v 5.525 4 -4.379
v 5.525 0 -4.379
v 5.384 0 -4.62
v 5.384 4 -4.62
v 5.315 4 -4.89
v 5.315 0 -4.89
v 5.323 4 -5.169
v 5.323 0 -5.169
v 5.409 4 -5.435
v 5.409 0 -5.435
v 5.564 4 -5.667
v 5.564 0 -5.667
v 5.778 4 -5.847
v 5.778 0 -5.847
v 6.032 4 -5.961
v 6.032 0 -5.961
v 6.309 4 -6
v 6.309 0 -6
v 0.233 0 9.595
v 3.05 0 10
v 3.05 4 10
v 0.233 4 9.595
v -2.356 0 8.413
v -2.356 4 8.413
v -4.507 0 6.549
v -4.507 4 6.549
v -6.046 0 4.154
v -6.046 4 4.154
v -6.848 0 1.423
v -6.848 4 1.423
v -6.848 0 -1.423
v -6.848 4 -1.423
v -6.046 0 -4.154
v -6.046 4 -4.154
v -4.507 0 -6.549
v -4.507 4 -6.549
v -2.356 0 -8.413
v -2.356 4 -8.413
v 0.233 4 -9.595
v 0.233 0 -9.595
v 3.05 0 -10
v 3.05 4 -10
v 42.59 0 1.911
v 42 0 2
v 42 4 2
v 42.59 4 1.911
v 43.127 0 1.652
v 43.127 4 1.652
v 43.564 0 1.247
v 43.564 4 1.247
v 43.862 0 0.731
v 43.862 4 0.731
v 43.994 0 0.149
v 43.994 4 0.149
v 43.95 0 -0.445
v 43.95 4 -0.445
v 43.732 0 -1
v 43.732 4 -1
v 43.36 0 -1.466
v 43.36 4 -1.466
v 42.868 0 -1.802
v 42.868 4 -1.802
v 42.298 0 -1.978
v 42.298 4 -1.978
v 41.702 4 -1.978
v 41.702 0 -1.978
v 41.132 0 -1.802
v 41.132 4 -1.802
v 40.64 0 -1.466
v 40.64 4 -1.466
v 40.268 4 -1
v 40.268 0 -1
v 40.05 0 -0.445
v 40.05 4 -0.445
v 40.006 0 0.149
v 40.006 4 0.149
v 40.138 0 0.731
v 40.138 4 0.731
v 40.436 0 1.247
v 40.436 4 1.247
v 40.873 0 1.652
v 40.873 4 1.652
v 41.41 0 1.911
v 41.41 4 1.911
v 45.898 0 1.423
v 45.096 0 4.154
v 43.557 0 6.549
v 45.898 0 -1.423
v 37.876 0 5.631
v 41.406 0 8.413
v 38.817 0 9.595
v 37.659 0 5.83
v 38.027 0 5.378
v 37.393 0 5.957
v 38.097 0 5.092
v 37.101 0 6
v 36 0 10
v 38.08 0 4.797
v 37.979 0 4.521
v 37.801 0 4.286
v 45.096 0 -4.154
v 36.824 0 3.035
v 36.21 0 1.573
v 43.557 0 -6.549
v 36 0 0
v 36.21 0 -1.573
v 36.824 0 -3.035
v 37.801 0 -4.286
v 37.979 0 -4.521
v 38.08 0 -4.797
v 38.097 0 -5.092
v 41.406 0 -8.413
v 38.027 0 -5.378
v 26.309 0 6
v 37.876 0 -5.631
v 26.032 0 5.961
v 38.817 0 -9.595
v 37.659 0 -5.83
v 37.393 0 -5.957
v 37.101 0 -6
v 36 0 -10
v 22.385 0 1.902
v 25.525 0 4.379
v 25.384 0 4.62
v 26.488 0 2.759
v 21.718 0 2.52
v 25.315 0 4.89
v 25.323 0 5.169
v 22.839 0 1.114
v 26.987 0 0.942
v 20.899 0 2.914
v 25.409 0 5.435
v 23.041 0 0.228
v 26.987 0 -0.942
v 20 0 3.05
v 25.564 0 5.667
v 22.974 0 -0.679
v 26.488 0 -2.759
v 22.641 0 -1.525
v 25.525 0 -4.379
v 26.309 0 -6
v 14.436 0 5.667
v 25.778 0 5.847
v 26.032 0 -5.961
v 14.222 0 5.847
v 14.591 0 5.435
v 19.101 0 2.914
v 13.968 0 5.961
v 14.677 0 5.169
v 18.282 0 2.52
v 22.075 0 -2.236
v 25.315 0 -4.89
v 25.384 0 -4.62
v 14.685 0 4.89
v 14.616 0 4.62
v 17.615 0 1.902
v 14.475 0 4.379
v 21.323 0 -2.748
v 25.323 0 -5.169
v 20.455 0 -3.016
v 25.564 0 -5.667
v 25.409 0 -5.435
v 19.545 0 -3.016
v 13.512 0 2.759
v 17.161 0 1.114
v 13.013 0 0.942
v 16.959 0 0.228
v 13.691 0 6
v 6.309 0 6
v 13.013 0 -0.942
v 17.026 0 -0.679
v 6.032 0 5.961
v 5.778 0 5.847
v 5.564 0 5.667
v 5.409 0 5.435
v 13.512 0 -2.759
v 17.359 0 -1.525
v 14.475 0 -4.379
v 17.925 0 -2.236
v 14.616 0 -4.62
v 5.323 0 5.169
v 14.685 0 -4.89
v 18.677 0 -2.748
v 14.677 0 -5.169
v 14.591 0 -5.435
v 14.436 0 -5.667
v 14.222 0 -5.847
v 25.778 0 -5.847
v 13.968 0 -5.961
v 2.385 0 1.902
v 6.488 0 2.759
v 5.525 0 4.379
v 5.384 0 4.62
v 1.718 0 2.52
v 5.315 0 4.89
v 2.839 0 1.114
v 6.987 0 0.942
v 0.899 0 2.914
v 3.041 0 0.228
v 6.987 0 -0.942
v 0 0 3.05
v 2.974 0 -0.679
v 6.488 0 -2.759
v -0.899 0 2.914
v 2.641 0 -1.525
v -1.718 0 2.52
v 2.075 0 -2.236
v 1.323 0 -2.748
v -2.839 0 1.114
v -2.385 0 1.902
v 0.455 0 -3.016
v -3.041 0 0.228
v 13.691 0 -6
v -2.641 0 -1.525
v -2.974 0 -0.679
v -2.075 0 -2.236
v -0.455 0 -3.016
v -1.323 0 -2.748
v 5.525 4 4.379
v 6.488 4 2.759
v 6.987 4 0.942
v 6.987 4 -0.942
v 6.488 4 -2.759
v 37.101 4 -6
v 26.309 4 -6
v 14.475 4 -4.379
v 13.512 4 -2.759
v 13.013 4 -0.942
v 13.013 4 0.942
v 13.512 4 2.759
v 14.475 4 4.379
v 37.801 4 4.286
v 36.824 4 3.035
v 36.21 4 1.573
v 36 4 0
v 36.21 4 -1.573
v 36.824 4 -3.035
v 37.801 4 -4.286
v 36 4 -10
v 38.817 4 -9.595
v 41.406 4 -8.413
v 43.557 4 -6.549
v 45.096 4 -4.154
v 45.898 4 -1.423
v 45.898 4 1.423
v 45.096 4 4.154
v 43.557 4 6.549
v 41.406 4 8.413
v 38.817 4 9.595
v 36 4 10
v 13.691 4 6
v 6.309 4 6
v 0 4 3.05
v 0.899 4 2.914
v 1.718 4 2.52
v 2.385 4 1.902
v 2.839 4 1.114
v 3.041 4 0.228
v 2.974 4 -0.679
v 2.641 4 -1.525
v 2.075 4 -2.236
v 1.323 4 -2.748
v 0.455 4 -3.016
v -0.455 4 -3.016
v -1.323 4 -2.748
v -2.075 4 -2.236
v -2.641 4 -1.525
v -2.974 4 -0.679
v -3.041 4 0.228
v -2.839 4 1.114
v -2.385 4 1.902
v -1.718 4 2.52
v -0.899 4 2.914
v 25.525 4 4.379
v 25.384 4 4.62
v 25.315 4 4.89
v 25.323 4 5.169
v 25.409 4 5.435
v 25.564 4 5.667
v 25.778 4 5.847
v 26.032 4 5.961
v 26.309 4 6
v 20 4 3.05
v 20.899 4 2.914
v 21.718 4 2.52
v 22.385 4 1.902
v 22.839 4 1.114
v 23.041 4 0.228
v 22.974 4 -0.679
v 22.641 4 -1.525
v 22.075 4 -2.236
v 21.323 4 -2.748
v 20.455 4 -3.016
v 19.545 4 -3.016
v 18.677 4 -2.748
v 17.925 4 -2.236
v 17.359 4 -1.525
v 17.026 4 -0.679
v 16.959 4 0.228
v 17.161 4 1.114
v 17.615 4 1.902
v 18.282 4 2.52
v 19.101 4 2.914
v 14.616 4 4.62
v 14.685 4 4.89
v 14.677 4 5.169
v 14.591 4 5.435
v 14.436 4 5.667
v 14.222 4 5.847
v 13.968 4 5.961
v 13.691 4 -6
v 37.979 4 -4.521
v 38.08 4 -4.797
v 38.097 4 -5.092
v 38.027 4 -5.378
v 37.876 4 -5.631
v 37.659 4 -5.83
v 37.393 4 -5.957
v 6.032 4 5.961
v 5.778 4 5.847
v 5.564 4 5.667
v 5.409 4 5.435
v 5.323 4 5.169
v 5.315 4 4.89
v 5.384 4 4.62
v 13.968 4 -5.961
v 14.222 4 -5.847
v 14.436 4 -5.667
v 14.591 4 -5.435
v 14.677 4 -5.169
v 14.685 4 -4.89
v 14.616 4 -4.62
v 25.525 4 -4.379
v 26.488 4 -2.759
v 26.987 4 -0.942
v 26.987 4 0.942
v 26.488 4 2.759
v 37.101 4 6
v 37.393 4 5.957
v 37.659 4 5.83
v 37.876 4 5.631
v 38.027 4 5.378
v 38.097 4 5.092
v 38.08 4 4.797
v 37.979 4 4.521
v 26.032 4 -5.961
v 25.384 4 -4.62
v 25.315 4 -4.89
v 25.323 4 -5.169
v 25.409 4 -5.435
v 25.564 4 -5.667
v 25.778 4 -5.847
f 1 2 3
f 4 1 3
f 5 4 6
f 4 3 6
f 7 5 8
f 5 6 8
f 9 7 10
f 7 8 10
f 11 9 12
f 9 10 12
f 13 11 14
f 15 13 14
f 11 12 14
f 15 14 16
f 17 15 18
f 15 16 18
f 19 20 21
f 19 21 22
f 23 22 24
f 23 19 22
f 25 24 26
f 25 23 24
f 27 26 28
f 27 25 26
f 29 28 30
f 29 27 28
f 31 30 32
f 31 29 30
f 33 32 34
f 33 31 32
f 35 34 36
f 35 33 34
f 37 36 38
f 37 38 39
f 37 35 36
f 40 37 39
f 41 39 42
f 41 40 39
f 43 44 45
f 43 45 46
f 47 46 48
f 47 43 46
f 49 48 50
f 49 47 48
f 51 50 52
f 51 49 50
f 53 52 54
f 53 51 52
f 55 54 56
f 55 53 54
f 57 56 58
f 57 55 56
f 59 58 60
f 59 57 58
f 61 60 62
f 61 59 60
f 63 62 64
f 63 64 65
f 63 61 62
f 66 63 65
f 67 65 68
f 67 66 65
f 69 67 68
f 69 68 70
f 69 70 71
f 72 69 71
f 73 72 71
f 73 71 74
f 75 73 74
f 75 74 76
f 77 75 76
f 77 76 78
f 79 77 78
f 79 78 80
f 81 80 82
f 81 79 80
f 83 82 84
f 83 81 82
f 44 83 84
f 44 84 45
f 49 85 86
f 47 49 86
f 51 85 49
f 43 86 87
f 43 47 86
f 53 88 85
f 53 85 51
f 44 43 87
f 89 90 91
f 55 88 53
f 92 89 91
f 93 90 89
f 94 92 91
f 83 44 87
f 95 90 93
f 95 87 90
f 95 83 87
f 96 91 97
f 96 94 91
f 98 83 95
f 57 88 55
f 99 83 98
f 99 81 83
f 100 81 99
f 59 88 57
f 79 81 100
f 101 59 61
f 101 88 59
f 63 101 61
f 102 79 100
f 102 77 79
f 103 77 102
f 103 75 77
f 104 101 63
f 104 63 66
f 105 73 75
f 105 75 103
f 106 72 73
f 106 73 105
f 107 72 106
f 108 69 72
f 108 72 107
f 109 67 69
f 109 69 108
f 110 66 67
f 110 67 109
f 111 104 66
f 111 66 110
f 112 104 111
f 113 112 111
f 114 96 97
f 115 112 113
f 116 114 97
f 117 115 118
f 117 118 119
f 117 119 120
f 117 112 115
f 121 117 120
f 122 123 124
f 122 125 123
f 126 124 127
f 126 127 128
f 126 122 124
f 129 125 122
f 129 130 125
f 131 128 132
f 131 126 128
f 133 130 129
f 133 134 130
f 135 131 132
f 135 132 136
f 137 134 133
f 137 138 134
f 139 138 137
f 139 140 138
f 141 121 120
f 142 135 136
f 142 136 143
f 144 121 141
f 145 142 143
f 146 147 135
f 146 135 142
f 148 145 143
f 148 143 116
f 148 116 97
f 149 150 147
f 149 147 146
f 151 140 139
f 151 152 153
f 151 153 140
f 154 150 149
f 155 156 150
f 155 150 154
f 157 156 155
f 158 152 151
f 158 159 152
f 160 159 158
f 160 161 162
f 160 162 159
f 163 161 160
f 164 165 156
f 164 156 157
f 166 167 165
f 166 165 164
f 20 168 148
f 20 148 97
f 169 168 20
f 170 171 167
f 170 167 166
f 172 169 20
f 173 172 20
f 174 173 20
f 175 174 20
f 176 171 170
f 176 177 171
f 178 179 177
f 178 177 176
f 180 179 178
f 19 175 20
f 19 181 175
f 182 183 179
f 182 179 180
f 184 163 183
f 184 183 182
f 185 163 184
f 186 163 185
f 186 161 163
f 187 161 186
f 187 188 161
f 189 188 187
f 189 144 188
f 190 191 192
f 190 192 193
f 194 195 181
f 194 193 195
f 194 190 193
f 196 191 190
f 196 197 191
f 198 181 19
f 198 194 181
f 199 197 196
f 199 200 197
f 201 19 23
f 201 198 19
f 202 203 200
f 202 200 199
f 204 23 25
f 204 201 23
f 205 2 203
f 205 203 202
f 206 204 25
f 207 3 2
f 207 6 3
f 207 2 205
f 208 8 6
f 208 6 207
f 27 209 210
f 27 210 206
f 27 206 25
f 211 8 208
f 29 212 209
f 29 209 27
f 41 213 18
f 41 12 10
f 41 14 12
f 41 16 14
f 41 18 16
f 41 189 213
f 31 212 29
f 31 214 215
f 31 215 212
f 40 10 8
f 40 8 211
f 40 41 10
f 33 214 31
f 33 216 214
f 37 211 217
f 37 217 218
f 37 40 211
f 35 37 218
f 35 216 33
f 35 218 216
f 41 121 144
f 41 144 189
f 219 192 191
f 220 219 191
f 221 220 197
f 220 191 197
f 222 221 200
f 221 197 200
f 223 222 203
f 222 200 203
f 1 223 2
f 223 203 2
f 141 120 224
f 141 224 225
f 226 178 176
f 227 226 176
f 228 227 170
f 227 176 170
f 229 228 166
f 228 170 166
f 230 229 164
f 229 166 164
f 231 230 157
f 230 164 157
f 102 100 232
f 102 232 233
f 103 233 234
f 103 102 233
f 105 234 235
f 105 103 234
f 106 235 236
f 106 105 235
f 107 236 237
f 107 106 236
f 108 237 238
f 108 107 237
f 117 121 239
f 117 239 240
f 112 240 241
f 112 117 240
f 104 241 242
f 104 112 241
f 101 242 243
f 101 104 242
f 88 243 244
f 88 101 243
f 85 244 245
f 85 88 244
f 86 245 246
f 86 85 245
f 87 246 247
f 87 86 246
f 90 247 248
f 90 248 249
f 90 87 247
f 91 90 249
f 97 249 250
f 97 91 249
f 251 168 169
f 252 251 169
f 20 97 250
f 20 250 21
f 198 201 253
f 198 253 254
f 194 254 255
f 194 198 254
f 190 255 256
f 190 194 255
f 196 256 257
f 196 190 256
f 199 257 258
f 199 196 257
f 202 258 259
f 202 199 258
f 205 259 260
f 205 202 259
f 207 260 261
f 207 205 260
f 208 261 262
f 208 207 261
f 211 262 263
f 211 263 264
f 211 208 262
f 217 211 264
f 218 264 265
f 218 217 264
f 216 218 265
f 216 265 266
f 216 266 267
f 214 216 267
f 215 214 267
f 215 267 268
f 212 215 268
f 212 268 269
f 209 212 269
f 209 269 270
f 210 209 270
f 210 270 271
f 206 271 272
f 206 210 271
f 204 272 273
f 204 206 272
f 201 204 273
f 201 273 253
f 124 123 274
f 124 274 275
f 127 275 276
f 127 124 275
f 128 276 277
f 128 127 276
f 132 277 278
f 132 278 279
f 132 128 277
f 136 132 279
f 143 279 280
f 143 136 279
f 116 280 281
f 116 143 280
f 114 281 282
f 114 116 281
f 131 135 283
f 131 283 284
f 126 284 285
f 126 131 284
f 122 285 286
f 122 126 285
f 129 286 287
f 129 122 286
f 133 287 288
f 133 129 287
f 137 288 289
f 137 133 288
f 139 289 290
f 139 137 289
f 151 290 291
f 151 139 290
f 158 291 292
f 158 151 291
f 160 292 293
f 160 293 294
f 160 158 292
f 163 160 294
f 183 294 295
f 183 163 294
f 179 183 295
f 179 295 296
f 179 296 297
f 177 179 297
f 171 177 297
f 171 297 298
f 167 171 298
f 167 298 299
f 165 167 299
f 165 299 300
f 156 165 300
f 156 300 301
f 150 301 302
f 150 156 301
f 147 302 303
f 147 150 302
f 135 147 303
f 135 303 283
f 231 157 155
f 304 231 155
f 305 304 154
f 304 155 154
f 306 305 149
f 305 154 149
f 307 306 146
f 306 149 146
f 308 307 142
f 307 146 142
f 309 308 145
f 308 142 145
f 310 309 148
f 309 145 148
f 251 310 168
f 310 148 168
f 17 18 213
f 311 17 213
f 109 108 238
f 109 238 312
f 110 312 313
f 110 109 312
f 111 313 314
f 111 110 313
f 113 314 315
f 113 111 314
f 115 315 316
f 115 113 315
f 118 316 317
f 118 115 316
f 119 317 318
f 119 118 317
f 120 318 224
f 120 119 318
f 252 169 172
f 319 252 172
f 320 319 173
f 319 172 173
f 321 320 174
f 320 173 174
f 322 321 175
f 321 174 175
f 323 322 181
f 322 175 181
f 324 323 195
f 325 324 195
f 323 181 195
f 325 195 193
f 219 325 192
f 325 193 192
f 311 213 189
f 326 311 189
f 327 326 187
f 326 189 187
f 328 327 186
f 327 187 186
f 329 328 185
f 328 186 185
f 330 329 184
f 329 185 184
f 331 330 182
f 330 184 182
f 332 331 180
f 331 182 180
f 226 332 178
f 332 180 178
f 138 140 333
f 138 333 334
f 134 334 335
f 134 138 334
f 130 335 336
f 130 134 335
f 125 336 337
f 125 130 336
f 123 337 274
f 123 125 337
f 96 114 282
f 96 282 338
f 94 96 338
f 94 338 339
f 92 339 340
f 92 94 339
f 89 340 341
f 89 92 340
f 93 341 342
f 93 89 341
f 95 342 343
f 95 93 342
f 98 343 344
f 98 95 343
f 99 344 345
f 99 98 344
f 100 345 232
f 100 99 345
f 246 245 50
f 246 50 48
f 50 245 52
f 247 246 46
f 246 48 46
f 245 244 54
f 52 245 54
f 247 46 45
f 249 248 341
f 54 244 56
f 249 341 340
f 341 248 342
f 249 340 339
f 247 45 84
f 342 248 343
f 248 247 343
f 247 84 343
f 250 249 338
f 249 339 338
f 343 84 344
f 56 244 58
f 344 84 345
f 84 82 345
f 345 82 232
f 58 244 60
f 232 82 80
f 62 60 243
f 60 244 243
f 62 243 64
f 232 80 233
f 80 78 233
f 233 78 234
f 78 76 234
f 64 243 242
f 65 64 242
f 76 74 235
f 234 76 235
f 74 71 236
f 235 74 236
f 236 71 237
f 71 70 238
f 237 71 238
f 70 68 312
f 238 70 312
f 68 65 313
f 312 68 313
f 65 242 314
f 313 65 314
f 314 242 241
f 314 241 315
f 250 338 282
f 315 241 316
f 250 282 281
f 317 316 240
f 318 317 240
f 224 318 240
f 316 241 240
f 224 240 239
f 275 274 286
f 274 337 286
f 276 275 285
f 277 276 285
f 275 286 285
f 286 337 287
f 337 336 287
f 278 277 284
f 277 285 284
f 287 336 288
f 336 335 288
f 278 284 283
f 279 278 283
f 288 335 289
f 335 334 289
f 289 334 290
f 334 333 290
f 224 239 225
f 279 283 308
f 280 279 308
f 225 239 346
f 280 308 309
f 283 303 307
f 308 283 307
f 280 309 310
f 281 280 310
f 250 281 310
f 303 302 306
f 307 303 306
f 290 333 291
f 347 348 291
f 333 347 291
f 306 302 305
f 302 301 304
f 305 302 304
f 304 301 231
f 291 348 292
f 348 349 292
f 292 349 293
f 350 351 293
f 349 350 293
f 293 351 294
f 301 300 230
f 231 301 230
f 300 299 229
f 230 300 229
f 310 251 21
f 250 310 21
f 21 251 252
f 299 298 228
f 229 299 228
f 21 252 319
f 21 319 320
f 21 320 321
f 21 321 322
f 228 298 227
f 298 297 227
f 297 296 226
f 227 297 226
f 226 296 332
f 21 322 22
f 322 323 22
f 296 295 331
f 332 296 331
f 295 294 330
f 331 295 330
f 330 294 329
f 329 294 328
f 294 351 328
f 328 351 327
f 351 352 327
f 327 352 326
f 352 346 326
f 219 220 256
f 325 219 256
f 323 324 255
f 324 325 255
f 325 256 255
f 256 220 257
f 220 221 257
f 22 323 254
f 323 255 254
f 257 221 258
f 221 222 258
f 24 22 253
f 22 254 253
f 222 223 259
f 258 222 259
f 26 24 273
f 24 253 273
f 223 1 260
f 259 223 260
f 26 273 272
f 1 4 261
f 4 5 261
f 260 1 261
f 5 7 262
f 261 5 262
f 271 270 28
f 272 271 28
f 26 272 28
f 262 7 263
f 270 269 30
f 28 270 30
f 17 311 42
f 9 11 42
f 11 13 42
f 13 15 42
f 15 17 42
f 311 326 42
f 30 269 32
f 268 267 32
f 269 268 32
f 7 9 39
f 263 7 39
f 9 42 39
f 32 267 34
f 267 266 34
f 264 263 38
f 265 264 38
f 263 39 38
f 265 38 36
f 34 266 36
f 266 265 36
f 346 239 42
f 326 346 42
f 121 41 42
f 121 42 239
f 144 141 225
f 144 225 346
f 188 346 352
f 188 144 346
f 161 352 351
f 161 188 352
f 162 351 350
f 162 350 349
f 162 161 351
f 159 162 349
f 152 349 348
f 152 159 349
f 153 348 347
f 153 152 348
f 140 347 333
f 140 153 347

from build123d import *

# Parameters (mm, degrees)
SKETCH1_R           = 2
SKETCH1_R_2         = 3.05
BOSS_EXTRUDE1_DEPTH = 4


with BuildPart() as part:
    # Sketch1 → Boss-Extrude1 (new body)
    with BuildSketch(Plane(origin=(0, 0, 0), x_dir=(1, 0, 0), z_dir=(0, 1, 0))):
        with BuildLine():
            Line((3.05, 10), (36, 10))
            ThreePointArc((36, 10), (46, 0), (36, -10))
            Line((36, -10), (3.05, -10))
            ThreePointArc((3.05, -10), (-6.95, 0), (3.05, 10))
        make_face()
        with Locations(Location((42, 0, 0), (0, 0, 270))):
            Circle(SKETCH1_R, mode=Mode.SUBTRACT)
        with Locations(Location((0, 0, 0), (0, 0, 270))):
            Circle(SKETCH1_R_2, mode=Mode.SUBTRACT)
        with Locations(Location((20, 0, 0), (0, 0, 270))):
            Circle(SKETCH1_R_2, mode=Mode.SUBTRACT)
        with BuildLine():
            Line((26.308922253, -6), (37.101020514, -6))
            ThreePointArc((37.101020514, -6), (38.026840614, -5.377964473), (37.800874727, -4.285714286))
            ThreePointArc((37.800874727, -4.285714286), (36, 0), (37.800874727, 4.285714286))
            ThreePointArc((37.800874727, 4.285714286), (38.026840614, 5.377964473), (37.101020514, 6))
            Line((37.101020514, 6), (26.308922253, 6))
            ThreePointArc((26.308922253, 6), (25.408611748, 5.435248198), (25.525205203, 4.378881988))
            ThreePointArc((25.525205203, 4.378881988), (27.05, 0), (25.525205203, -4.378881988))
            ThreePointArc((25.525205203, -4.378881988), (25.408611748, -5.435248198), (26.308922253, -6))
        make_face(mode=Mode.SUBTRACT)
        with BuildLine():
            Line((6.308922253, 6), (13.691077747, 6))
            ThreePointArc((13.691077747, 6), (14.591388252, 5.435248198), (14.474794797, 4.378881988))
            ThreePointArc((14.474794797, 4.378881988), (12.95, 0), (14.474794797, -4.378881988))
            ThreePointArc((14.474794797, -4.378881988), (14.591388252, -5.435248198), (13.691077747, -6))
            Line((13.691077747, -6), (6.308922253, -6))
            ThreePointArc((6.308922253, -6), (5.408611748, -5.435248198), (5.525205203, -4.378881988))
            ThreePointArc((5.525205203, -4.378881988), (7.05, 0), (5.525205203, 4.378881988))
            ThreePointArc((5.525205203, 4.378881988), (5.408611748, 5.435248198), (6.308922253, 6))
        make_face(mode=Mode.SUBTRACT)
    extrude(amount=BOSS_EXTRUDE1_DEPTH)


solid = part.part
